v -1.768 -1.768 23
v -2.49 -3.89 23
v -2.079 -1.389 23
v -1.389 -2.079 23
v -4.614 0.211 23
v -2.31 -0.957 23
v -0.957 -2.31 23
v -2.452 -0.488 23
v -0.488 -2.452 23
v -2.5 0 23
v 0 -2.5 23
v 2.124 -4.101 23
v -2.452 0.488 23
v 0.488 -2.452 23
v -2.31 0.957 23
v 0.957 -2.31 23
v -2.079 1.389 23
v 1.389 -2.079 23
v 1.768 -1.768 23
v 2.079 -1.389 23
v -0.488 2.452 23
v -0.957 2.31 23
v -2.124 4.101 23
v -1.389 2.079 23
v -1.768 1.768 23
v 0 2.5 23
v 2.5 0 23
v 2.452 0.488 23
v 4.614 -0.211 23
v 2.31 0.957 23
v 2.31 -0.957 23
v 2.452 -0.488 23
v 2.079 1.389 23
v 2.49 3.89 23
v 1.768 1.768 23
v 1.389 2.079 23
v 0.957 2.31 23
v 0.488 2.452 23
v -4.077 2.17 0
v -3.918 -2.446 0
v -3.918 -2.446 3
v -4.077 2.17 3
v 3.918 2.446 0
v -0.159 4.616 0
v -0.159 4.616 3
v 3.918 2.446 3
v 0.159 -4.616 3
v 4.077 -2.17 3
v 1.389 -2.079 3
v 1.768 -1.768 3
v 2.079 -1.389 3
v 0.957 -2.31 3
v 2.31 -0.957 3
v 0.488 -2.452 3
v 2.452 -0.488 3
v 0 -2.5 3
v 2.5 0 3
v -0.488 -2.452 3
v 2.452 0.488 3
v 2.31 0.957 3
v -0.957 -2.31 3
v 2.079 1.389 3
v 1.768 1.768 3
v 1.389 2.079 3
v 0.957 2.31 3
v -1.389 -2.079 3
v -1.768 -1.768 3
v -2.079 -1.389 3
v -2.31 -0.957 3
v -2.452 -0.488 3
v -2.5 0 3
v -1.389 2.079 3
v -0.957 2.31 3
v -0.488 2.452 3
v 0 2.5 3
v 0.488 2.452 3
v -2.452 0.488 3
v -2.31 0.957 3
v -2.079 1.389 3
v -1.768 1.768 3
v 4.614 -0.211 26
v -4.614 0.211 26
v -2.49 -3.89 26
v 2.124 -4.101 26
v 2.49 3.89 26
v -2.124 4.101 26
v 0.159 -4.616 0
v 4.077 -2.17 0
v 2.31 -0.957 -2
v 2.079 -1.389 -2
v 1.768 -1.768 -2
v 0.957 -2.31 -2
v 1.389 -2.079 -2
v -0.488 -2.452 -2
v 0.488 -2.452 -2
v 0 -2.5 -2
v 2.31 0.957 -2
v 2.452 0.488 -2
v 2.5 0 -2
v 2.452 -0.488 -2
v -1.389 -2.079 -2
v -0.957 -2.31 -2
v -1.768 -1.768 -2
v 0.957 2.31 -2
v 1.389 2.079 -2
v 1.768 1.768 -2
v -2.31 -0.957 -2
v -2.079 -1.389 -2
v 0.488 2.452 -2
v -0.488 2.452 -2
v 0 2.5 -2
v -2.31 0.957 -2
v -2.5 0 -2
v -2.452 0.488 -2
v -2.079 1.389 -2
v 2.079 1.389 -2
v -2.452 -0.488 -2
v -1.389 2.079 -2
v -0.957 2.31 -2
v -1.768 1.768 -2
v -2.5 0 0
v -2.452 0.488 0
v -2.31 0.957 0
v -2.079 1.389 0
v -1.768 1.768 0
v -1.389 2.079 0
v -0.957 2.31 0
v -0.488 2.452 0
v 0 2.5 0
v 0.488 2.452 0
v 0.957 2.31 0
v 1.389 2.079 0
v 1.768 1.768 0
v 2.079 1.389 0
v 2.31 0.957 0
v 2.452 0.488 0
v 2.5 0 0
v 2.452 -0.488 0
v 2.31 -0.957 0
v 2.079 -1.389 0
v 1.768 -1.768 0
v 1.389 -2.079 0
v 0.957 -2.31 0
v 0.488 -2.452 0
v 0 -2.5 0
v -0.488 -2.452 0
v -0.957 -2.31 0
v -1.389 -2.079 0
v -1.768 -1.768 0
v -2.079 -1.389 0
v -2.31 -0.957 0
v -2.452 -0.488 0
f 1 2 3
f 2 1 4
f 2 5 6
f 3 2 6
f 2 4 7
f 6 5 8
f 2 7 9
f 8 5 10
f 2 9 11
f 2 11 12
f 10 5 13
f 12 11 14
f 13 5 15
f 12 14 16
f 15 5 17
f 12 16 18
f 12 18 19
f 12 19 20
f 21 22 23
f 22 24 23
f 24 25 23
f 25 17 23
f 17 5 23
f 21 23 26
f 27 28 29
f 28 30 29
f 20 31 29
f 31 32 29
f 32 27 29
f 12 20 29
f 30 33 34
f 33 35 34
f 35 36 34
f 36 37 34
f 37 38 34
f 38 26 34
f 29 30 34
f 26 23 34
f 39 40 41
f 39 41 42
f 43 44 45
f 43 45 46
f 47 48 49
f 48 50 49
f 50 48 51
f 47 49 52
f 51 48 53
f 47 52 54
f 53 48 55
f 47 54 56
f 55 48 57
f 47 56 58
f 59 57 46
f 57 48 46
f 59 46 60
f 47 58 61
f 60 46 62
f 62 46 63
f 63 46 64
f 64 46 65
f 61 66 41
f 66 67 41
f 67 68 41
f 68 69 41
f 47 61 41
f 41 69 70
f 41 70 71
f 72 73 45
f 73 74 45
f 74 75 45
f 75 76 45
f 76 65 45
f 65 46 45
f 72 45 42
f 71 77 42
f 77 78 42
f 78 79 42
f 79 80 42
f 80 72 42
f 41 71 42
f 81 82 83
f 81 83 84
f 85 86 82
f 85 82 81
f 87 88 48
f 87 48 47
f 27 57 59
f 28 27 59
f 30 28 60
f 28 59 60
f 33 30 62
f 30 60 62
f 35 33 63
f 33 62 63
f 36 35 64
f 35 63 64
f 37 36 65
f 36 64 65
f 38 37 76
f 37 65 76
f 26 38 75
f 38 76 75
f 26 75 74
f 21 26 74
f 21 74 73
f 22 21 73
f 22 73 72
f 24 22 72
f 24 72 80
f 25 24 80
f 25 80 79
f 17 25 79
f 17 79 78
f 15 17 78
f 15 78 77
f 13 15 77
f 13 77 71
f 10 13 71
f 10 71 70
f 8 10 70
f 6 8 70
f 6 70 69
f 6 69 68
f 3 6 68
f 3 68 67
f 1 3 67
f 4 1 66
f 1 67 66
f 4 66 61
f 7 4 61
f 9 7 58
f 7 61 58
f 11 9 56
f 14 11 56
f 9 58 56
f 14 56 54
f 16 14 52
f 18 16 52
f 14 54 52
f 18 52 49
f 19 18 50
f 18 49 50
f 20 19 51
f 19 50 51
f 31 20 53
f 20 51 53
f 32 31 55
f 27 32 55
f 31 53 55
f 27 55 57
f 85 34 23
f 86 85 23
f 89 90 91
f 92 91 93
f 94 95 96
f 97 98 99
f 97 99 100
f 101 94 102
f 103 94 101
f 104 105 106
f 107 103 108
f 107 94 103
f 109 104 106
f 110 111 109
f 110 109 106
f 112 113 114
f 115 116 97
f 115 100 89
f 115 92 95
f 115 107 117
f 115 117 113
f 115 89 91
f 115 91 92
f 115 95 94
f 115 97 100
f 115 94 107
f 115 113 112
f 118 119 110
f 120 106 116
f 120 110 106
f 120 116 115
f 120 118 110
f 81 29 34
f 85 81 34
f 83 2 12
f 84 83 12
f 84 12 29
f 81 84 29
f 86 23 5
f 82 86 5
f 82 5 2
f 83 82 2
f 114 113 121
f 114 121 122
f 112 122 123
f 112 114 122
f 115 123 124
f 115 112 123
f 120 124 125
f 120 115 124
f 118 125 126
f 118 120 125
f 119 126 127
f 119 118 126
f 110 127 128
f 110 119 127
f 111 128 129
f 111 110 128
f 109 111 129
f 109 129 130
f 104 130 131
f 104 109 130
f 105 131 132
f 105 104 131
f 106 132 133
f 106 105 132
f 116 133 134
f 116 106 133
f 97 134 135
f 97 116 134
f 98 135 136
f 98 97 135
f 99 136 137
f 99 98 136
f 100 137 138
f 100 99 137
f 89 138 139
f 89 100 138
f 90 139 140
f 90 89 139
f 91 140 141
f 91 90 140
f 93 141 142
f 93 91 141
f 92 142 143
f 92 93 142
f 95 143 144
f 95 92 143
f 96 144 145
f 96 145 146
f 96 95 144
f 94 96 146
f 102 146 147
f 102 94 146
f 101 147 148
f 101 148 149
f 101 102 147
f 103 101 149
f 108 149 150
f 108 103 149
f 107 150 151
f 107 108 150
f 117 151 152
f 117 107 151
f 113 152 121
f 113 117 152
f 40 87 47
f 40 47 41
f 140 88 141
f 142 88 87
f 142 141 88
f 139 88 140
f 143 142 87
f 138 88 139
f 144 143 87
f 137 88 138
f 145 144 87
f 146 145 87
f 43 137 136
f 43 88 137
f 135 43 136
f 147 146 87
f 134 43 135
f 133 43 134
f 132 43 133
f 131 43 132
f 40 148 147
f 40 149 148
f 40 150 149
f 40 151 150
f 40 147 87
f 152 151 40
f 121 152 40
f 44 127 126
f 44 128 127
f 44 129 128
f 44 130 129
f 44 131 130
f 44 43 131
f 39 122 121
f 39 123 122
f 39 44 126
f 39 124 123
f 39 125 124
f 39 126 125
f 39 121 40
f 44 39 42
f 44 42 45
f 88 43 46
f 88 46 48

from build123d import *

# Parameters (mm, degrees)
SKETCH1_R           = 2.5
BOSS_EXTRUDE1_DEPTH = 23
BOSS_EXTRUDE2_DEPTH = 3
BOSS_EXTRUDE3_DEPTH = 3
BOSS_EXTRUDE4_START = 2
SKETCH4_R           = 2.5
BOSS_EXTRUDE4_DEPTH = 2


with BuildPart() as part:
    # Sketch1 → Boss-Extrude1 (new body)
    with BuildSketch(Plane.XY):
        Circle(SKETCH1_R)
    extrude(amount=BOSS_EXTRUDE1_DEPTH)

    # Sketch2 → Boss-Extrude2 (add)
    with BuildSketch(Plane.XY.offset(23)):
        Polygon((2.489504252, 3.890462943), (-2.124487616, 4.101205397), (-4.613991867, 0.210742453), (-2.489504252, -3.890462943), (2.124487616, -4.101205397), (4.613991867, -0.210742453), align=None)
    extrude(amount=BOSS_EXTRUDE2_DEPTH)

    # Sketch3 → Boss-Extrude3 (add)
    with BuildSketch(Plane(origin=(0, 0, 0), x_dir=(-1, 0, 0), z_dir=(0, 0, -1))):
        Polygon((4.077074227, 2.170437533), (0.158883072, 4.61606862), (-3.918191154, 2.445631087), (-4.077074227, -2.170437533), (-0.158883072, -4.61606862), (3.918191154, -2.445631087), align=None)
    extrude(amount=-BOSS_EXTRUDE3_DEPTH)

    # Sketch4 → Boss-Extrude4 (add)
    with BuildSketch(Plane(origin=(0, 0, 0), x_dir=(-1, 0, 0), z_dir=(0, 0, -1)).offset(BOSS_EXTRUDE4_START)):
        Circle(SKETCH4_R)
    extrude(amount=-BOSS_EXTRUDE4_DEPTH)


solid = part.part
